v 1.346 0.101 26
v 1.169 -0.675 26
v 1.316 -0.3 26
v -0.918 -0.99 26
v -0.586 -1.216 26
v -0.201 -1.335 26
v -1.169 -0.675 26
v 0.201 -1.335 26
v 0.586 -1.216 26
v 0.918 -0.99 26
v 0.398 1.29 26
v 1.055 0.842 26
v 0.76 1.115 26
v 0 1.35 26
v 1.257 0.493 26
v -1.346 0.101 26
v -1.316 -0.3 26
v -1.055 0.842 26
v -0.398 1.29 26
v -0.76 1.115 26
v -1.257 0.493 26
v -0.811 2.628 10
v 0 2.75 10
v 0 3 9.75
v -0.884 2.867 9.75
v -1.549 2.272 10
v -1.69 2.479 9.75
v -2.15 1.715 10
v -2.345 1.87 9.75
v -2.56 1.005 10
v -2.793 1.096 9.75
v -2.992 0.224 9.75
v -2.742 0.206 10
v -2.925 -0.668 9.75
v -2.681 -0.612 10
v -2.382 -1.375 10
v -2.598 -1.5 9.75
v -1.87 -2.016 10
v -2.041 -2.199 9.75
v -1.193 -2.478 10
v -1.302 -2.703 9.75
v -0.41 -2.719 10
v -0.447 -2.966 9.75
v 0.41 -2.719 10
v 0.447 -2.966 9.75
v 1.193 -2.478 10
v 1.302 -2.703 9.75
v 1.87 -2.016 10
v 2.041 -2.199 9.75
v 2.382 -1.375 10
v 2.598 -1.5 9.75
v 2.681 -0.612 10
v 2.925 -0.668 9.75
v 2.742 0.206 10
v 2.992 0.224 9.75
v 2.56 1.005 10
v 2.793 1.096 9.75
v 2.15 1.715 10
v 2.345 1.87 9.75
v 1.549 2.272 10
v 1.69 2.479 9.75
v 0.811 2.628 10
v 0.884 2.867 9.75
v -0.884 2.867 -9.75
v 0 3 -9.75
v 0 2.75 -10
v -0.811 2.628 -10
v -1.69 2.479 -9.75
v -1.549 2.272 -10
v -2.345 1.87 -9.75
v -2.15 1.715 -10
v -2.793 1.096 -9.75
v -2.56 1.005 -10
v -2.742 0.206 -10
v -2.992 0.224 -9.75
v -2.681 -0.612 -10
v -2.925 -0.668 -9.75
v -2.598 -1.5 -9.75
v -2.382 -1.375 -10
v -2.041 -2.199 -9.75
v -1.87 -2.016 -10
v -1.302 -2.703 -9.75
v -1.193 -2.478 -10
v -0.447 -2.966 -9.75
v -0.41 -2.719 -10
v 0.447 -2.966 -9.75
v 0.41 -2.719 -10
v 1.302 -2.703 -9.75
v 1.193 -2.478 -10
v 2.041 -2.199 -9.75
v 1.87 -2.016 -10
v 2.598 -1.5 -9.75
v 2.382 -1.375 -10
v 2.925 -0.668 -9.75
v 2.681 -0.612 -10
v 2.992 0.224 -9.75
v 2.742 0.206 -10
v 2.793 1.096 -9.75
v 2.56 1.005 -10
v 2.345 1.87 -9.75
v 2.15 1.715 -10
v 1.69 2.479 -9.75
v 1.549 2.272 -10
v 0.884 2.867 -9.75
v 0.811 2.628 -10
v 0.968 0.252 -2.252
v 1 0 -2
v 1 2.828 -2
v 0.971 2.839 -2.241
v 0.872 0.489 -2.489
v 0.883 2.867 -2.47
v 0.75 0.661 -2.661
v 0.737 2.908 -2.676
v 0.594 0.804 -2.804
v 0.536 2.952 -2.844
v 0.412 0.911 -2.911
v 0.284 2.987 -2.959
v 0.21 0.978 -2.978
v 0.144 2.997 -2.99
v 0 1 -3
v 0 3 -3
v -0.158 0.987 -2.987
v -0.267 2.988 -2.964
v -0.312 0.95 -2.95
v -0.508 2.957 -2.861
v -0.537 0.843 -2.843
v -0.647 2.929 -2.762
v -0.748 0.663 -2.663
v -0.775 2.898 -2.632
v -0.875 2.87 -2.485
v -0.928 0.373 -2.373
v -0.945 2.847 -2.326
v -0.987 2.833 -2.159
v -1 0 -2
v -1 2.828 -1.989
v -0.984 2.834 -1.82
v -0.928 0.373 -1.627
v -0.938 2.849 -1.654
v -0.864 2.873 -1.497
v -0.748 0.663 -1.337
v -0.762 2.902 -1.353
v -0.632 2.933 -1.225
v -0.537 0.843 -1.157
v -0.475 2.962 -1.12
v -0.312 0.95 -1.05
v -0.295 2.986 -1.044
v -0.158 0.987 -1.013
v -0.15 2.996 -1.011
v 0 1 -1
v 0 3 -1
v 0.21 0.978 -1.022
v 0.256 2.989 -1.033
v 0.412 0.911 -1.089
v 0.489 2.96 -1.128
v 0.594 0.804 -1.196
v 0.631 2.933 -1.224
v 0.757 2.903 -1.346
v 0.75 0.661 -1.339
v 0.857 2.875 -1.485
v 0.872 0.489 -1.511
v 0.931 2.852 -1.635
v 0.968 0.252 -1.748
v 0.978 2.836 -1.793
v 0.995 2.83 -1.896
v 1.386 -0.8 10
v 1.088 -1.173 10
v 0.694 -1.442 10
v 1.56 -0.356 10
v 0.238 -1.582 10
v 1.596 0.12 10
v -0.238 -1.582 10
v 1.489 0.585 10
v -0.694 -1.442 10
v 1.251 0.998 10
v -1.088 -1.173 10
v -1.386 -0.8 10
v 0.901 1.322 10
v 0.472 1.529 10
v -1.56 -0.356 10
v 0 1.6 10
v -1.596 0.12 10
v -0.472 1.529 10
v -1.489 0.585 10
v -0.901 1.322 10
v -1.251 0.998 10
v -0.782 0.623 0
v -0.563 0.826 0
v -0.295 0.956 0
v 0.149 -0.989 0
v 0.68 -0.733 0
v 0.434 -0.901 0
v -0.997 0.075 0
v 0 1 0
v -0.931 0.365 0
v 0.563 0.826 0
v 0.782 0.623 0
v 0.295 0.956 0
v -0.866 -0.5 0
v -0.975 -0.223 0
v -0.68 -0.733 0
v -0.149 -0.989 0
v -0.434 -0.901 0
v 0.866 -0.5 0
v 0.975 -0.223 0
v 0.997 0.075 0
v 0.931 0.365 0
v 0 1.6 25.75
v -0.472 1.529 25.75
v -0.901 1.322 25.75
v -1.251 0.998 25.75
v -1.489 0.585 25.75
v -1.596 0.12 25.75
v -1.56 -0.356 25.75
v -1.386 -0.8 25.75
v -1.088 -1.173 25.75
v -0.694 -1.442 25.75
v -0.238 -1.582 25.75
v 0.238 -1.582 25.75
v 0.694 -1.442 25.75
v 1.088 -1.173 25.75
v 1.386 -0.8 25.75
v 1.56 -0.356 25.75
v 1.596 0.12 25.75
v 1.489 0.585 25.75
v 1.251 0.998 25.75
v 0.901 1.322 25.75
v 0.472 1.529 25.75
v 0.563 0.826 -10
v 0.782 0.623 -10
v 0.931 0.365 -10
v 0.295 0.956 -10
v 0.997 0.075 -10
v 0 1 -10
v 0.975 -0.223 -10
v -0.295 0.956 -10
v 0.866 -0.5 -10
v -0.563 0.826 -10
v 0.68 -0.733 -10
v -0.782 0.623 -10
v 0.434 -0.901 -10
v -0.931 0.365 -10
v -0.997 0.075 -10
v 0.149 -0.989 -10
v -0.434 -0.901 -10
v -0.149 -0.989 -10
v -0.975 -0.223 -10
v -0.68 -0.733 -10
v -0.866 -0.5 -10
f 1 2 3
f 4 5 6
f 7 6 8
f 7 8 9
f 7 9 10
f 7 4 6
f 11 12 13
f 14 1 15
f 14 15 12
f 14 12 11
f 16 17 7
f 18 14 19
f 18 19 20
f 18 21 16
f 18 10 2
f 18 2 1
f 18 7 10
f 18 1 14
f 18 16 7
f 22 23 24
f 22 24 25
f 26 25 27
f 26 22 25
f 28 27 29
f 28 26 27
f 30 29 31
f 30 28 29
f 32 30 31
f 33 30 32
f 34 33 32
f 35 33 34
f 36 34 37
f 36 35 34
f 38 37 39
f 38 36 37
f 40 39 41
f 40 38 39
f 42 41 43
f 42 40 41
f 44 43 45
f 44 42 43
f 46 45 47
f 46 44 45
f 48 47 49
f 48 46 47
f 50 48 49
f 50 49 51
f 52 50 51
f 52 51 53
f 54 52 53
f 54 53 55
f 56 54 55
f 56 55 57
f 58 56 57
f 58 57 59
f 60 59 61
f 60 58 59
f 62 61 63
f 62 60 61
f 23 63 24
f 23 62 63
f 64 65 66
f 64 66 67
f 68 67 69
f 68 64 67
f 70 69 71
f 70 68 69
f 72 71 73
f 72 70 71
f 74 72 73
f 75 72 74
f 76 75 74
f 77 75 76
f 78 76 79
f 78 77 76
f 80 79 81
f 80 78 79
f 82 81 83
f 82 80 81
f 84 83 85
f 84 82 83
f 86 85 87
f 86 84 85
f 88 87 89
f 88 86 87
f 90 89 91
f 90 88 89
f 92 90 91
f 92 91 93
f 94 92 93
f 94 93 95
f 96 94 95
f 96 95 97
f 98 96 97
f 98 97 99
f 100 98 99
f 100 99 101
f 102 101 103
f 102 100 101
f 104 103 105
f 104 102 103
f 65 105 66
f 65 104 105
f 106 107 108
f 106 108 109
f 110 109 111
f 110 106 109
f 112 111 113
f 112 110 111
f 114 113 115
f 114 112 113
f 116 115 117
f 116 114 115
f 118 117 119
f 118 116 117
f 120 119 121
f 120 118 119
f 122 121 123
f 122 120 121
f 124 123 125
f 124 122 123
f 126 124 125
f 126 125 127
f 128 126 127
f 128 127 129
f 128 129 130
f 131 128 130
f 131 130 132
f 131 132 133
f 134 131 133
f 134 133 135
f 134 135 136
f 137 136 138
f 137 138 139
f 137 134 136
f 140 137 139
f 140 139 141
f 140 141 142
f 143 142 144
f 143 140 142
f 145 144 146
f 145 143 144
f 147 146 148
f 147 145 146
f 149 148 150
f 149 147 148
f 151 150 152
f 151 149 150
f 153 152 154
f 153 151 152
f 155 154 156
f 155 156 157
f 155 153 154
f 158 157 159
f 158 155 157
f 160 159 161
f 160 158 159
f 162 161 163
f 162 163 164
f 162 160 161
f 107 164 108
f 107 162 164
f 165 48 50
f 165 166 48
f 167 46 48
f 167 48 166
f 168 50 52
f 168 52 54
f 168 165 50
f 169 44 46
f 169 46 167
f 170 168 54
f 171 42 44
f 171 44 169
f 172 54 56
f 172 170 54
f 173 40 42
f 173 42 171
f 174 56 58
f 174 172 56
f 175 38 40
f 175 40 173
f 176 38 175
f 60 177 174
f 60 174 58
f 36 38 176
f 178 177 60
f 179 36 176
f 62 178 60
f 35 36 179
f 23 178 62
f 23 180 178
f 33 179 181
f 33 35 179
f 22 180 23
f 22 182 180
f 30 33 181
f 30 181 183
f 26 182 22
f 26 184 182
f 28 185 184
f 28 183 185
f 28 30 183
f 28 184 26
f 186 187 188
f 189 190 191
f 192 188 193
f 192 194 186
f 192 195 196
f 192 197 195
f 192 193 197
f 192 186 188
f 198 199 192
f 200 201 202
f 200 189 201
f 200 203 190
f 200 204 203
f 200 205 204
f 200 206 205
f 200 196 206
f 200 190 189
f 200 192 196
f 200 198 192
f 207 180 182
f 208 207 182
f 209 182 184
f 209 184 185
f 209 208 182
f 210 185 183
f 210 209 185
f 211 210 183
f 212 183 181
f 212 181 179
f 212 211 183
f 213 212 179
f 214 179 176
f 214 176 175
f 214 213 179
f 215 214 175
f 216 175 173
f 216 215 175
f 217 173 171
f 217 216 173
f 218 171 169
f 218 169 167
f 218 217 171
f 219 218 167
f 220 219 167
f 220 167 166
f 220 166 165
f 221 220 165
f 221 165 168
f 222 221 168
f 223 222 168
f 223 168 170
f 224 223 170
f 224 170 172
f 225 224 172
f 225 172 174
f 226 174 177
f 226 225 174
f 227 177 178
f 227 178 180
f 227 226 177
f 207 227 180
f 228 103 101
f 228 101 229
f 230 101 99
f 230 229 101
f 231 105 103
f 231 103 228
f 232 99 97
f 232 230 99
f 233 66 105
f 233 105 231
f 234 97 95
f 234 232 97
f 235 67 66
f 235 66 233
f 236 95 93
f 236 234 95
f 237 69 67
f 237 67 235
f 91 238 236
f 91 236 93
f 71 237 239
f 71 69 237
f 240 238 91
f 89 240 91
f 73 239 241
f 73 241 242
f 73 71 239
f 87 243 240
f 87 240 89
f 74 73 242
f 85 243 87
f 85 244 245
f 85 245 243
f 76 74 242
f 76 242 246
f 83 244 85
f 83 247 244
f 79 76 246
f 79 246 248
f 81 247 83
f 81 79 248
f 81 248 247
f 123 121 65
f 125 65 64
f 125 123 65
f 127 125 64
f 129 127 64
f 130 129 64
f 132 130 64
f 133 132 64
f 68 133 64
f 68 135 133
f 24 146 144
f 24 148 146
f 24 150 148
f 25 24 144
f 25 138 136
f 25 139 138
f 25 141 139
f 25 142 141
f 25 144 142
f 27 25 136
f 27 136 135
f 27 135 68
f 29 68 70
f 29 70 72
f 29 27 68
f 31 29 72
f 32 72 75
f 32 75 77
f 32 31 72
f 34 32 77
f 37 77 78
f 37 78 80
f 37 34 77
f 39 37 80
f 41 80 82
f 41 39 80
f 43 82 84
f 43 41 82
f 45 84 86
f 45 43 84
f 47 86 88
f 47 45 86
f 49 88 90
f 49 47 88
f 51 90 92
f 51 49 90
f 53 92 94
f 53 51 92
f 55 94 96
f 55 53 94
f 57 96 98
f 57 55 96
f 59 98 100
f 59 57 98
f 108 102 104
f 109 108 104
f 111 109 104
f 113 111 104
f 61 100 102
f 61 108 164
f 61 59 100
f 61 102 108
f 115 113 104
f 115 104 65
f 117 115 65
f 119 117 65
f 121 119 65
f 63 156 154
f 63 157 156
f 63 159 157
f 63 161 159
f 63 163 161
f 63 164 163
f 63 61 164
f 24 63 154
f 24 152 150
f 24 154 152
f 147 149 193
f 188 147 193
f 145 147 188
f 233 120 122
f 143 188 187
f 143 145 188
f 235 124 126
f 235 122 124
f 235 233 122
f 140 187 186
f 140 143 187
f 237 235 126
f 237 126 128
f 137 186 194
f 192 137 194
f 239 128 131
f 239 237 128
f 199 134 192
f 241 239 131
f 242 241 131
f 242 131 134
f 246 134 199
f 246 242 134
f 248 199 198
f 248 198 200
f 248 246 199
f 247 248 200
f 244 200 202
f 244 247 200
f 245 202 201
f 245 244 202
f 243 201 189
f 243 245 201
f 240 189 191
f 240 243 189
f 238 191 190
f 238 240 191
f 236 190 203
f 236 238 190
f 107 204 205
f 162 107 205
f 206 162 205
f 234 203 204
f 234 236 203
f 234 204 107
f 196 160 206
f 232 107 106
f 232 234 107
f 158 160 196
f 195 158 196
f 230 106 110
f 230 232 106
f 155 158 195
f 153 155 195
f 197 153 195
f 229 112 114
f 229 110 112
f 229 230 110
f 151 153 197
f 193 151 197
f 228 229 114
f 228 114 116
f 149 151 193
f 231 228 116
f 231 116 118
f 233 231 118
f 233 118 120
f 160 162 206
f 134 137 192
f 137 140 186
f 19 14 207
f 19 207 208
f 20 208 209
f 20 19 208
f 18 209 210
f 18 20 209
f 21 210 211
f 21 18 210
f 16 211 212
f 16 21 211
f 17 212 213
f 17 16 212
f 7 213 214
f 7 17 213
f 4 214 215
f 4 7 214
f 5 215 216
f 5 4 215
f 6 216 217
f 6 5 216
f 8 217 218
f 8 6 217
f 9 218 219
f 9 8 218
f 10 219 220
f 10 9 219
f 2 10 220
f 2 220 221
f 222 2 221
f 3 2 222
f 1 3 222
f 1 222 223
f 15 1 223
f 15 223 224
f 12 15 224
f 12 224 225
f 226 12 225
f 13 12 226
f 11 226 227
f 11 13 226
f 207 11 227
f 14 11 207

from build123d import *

# Parameters (mm, degrees)
SKIZZE2_R                       = 1
SCHNITT_LINEAR_AUSTRAGEN1_DEPTH = 4
FASE1_SIZE                      = 0.25


with BuildPart() as part:
    # Skizze1 → Rotation1 (revolve)
    with BuildSketch(Plane(origin=(0, 0, 0), x_dir=(0, 0, -1), z_dir=(1, 0, 0))):
        Polygon((0, 1), (10, 1), (10, 3), (-10, 3), (-10, 1.6), (-26, 1.6), (-26, 0), (0, 0), align=None)
    revolve(axis=Axis((0, 0, 0), (0, 0, 1)))

    # Skizze2 → Schnitt-Linear austragen1 (cut, through all)
    with BuildSketch(Plane(origin=(0, 0, 0), x_dir=(1, 0, 0), z_dir=(0, 1, 0))):
        with Locations((0, 2)):
            Circle(SKIZZE2_R)
    extrude(amount=SCHNITT_LINEAR_AUSTRAGEN1_DEPTH, mode=Mode.SUBTRACT)

    # Fase1
    fase1_edges = [part.edges().sort_by_distance(p)[0] for p in [
        (0, -3, -10),
        (0, -3, 10),
        (0, -1.6, 26),
    ]]
    chamfer(fase1_edges, length=FASE1_SIZE)


solid = part.part
